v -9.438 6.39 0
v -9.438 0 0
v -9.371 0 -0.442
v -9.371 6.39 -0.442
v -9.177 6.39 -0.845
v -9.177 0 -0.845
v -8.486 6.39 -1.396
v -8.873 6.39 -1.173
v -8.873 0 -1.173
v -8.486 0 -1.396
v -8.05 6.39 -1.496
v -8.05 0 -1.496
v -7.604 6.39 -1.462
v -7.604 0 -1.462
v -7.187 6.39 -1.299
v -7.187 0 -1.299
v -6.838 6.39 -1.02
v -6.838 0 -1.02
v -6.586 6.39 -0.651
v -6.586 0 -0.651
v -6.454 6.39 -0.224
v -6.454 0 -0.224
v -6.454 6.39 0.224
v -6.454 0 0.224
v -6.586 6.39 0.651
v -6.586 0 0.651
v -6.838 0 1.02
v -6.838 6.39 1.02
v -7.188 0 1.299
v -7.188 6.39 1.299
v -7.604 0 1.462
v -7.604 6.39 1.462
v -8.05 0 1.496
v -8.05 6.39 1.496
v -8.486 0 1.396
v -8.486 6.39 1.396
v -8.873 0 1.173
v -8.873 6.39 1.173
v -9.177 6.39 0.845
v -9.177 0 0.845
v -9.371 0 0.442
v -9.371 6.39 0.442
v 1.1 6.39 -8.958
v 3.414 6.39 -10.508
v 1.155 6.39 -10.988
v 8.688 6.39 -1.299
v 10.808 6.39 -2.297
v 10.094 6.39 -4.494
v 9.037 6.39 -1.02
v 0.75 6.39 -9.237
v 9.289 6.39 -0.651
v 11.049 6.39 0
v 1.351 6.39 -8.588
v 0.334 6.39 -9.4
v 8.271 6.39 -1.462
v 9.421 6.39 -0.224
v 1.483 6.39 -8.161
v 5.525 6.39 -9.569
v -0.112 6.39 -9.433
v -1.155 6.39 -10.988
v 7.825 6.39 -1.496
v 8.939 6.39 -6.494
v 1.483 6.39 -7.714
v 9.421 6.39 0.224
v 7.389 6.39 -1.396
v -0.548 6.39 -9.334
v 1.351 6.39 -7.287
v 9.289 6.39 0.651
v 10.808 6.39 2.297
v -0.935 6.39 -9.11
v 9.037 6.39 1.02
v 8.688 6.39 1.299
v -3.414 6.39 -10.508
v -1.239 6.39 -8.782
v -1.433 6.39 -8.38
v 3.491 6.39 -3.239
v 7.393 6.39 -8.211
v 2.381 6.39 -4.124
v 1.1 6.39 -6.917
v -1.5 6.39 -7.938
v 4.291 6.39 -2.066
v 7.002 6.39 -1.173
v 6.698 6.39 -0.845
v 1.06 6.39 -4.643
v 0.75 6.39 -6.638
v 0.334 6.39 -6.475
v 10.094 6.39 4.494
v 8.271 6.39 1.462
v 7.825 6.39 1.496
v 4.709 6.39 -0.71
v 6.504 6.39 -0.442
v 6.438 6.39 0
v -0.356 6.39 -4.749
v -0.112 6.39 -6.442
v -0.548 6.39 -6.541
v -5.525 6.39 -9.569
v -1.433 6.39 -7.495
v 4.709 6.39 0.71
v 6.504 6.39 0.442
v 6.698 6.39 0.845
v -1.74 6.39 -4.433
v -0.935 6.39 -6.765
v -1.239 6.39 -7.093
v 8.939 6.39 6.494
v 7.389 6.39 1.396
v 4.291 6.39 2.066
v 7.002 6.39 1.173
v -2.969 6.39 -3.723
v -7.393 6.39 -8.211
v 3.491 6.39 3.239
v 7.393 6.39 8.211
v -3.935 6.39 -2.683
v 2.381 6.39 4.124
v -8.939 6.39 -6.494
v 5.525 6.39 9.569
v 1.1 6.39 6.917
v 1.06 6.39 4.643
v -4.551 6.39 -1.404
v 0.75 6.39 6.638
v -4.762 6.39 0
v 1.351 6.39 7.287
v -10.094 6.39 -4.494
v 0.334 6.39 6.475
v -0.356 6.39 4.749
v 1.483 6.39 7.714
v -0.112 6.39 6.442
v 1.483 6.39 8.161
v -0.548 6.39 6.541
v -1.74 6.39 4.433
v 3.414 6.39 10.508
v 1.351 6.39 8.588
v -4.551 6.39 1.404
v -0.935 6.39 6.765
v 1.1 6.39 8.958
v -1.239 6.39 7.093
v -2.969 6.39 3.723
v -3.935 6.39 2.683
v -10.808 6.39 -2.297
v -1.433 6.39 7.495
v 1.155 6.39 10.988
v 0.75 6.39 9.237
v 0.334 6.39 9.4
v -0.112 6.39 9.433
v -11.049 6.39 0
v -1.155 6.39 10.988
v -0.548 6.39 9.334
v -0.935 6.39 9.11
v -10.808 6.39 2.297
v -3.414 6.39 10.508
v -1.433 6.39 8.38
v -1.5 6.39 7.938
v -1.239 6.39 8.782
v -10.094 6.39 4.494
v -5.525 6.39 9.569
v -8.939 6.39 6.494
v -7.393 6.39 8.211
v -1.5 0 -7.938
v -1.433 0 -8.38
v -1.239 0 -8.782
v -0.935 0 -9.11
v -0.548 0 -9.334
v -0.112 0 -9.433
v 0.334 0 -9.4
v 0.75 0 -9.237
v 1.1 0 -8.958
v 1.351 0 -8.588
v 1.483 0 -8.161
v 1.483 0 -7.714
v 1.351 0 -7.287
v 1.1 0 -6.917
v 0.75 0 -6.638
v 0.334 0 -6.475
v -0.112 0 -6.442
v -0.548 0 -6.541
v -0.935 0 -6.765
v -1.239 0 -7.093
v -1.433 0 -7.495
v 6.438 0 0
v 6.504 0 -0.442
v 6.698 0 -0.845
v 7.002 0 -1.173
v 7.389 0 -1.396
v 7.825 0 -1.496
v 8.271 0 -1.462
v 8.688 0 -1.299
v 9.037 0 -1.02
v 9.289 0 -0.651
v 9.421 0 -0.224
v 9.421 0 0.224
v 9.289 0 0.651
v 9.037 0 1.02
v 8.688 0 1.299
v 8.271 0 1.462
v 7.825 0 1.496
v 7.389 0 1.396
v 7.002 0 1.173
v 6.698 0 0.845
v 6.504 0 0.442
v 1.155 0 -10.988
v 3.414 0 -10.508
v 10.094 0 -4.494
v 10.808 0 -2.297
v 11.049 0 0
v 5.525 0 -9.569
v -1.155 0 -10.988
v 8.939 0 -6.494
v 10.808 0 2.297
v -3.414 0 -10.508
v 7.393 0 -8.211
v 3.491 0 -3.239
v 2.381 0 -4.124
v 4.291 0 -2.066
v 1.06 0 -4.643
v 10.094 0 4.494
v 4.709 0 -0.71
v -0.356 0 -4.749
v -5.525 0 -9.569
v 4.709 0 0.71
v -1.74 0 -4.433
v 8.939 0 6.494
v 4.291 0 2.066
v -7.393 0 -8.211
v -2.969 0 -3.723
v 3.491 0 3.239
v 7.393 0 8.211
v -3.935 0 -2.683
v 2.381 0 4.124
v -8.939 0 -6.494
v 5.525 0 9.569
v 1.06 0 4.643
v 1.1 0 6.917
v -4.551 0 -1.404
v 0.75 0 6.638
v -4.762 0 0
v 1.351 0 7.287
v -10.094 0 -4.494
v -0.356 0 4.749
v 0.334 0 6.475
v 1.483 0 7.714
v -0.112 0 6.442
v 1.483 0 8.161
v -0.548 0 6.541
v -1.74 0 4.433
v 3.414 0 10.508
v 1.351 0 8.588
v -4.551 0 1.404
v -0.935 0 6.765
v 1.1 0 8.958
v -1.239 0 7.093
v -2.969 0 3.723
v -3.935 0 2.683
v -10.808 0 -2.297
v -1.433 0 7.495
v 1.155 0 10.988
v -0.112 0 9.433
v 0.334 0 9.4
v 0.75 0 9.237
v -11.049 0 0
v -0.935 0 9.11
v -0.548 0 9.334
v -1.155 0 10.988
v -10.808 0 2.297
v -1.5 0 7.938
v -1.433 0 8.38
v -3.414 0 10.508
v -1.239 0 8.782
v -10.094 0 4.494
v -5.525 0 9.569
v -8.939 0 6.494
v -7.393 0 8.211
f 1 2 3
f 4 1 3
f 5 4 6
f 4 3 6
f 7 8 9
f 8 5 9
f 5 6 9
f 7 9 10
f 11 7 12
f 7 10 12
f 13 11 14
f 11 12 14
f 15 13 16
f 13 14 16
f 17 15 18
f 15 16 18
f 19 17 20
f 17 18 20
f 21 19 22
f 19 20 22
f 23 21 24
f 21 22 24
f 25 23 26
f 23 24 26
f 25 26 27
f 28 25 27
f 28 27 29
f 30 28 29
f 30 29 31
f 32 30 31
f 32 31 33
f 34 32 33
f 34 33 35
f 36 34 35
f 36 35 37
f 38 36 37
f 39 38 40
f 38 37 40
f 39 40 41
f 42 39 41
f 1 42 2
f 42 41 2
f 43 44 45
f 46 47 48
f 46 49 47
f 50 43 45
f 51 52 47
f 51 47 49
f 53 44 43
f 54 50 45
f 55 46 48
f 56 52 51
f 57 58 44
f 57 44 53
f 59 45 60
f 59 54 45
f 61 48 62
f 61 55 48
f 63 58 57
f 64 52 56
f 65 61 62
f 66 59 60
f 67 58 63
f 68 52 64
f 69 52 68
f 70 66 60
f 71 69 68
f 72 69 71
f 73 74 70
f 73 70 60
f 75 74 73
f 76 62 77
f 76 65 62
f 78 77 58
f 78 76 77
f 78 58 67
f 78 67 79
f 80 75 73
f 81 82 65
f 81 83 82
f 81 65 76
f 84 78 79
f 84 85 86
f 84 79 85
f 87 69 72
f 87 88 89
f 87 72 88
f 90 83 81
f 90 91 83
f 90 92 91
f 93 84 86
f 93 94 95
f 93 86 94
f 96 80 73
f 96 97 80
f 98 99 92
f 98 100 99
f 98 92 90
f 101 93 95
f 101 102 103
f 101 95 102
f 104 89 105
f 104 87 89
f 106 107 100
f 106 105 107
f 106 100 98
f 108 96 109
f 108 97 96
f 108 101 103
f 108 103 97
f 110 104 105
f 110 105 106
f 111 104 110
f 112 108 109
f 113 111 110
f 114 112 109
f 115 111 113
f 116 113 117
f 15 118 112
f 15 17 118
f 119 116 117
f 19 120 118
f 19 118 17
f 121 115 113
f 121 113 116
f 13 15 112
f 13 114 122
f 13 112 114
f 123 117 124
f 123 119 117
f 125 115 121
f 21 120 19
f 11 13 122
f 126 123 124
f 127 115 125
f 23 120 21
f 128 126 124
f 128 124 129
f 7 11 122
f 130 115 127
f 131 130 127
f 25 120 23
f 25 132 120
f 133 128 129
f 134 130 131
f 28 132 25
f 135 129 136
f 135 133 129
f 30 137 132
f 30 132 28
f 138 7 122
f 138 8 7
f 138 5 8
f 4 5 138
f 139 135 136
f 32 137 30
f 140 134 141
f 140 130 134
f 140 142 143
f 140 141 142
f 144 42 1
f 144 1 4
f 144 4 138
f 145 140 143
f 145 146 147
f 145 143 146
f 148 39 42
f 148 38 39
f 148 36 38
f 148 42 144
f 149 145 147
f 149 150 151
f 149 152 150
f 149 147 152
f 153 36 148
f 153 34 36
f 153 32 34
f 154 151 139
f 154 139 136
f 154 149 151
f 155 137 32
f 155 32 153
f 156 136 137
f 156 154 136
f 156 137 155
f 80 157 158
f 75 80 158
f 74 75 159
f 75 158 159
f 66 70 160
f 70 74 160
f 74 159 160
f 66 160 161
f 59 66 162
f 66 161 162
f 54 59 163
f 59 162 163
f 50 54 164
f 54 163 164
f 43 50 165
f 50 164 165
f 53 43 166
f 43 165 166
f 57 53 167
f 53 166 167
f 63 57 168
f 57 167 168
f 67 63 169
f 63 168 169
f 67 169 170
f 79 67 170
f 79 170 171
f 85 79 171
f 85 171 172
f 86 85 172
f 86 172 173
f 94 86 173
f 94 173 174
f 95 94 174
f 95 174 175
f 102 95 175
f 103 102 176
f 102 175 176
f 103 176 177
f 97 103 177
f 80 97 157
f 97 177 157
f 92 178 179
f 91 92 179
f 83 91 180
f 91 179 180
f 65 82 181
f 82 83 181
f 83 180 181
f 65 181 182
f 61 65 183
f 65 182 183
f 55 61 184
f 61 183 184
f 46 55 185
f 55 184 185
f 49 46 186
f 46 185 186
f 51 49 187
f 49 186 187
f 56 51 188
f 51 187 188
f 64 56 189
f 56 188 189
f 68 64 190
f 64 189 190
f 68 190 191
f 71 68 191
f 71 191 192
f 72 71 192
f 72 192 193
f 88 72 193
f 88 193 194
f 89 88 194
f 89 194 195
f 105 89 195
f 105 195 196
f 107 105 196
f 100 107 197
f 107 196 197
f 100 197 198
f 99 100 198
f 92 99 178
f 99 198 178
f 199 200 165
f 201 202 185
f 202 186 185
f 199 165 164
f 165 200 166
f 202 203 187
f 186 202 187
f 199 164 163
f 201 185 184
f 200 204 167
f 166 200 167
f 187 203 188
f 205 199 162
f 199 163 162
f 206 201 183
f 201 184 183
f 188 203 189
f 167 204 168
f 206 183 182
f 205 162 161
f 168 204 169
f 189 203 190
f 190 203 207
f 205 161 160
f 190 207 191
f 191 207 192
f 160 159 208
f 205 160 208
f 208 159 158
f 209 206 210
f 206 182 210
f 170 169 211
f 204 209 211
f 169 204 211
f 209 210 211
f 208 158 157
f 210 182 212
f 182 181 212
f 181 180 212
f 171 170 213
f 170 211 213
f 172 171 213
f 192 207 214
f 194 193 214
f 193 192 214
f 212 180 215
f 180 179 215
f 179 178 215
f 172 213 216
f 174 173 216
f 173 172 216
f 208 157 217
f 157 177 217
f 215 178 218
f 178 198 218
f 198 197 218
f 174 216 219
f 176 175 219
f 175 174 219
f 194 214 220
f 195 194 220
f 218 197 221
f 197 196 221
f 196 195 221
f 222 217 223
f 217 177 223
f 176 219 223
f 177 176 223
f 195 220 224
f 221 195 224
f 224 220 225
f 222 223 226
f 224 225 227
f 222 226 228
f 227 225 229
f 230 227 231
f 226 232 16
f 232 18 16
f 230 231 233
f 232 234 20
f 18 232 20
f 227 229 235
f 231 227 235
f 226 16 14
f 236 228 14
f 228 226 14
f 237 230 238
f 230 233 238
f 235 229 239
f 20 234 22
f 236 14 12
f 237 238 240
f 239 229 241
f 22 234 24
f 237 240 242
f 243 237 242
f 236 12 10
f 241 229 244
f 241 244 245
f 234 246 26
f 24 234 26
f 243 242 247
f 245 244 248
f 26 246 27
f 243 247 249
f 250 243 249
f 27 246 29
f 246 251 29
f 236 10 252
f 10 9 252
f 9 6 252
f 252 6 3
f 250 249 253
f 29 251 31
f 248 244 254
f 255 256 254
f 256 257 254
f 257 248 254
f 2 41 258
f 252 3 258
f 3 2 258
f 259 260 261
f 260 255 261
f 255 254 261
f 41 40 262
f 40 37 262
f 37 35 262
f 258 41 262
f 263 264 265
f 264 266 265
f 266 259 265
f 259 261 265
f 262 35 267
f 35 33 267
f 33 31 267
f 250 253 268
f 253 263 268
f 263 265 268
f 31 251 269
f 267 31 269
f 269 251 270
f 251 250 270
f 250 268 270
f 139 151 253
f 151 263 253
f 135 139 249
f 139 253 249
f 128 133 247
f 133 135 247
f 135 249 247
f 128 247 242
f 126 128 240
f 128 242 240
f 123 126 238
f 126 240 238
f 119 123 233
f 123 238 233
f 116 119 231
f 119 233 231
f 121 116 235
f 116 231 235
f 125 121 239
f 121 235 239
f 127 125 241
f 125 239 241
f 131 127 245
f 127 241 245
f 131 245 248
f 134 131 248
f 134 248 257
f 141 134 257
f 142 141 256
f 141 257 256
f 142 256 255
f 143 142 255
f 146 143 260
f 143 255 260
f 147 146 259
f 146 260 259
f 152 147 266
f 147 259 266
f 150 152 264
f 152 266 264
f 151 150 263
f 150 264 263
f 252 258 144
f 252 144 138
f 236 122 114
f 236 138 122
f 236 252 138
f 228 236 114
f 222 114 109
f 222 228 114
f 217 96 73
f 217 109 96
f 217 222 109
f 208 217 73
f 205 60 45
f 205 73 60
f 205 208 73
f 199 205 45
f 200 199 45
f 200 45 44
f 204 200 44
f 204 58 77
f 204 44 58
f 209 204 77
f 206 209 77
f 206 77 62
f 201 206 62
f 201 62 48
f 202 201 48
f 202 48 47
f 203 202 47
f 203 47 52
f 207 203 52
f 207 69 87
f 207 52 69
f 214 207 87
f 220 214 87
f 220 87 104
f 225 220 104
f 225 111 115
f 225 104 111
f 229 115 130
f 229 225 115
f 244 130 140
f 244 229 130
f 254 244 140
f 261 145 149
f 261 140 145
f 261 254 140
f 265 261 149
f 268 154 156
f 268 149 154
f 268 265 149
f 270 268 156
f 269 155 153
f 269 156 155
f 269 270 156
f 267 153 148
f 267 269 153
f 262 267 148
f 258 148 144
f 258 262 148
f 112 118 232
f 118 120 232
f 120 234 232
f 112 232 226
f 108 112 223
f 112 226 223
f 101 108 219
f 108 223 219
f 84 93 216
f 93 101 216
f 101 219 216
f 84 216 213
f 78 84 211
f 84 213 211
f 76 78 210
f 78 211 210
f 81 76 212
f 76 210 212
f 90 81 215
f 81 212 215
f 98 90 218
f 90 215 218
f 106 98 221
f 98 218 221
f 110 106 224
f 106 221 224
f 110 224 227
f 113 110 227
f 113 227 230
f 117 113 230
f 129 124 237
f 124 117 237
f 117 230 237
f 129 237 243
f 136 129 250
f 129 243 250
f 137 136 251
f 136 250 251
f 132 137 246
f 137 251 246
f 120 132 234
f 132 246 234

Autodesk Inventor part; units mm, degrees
ref_plane "YZ Plane" through (0, 0, 0) normal (1, 0, 0) x (0, 1, 0)
ref_plane "XZ Plane" through (0, 0, 0) normal (0, 1, 0) x (-1, 0, 0)
ref_plane "XY Plane" through (0, 0, 0) normal (0, 0, 1) x (1, 0, 0)
sketch "Sketch1" plane through (0, 0, 0) normal (0, 1, 0) x (-1, 0, 0)
  circle A0 centre (0, 0) radius 11.049
  circle A1 centre (7.9375, 0) radius 1.5
  circle A2 centre (0, 7.9375) radius 1.5
  circle A3 centre (-7.9375, 0) radius 1.5
  circle A4 centre (0, -7.9375) radius 1.5
  circle A5 centre (0, 0) radius 4.7625
  dimension "d0" = 22.098
  dimension "d1" = 3
  dimension "d2" = 7.9375
  dimension "d5" = 360
  dimension "d7" = 9.525
extrude "Extrusion1" add sketch "Sketch1" along normal blind 6.39
equation "\"d8\" = WoodThickness"
equation "\"WoodThickness\" = 6.39"
properties part number "CouplingExtender" material "MDF Medium Density Fiberboard"
